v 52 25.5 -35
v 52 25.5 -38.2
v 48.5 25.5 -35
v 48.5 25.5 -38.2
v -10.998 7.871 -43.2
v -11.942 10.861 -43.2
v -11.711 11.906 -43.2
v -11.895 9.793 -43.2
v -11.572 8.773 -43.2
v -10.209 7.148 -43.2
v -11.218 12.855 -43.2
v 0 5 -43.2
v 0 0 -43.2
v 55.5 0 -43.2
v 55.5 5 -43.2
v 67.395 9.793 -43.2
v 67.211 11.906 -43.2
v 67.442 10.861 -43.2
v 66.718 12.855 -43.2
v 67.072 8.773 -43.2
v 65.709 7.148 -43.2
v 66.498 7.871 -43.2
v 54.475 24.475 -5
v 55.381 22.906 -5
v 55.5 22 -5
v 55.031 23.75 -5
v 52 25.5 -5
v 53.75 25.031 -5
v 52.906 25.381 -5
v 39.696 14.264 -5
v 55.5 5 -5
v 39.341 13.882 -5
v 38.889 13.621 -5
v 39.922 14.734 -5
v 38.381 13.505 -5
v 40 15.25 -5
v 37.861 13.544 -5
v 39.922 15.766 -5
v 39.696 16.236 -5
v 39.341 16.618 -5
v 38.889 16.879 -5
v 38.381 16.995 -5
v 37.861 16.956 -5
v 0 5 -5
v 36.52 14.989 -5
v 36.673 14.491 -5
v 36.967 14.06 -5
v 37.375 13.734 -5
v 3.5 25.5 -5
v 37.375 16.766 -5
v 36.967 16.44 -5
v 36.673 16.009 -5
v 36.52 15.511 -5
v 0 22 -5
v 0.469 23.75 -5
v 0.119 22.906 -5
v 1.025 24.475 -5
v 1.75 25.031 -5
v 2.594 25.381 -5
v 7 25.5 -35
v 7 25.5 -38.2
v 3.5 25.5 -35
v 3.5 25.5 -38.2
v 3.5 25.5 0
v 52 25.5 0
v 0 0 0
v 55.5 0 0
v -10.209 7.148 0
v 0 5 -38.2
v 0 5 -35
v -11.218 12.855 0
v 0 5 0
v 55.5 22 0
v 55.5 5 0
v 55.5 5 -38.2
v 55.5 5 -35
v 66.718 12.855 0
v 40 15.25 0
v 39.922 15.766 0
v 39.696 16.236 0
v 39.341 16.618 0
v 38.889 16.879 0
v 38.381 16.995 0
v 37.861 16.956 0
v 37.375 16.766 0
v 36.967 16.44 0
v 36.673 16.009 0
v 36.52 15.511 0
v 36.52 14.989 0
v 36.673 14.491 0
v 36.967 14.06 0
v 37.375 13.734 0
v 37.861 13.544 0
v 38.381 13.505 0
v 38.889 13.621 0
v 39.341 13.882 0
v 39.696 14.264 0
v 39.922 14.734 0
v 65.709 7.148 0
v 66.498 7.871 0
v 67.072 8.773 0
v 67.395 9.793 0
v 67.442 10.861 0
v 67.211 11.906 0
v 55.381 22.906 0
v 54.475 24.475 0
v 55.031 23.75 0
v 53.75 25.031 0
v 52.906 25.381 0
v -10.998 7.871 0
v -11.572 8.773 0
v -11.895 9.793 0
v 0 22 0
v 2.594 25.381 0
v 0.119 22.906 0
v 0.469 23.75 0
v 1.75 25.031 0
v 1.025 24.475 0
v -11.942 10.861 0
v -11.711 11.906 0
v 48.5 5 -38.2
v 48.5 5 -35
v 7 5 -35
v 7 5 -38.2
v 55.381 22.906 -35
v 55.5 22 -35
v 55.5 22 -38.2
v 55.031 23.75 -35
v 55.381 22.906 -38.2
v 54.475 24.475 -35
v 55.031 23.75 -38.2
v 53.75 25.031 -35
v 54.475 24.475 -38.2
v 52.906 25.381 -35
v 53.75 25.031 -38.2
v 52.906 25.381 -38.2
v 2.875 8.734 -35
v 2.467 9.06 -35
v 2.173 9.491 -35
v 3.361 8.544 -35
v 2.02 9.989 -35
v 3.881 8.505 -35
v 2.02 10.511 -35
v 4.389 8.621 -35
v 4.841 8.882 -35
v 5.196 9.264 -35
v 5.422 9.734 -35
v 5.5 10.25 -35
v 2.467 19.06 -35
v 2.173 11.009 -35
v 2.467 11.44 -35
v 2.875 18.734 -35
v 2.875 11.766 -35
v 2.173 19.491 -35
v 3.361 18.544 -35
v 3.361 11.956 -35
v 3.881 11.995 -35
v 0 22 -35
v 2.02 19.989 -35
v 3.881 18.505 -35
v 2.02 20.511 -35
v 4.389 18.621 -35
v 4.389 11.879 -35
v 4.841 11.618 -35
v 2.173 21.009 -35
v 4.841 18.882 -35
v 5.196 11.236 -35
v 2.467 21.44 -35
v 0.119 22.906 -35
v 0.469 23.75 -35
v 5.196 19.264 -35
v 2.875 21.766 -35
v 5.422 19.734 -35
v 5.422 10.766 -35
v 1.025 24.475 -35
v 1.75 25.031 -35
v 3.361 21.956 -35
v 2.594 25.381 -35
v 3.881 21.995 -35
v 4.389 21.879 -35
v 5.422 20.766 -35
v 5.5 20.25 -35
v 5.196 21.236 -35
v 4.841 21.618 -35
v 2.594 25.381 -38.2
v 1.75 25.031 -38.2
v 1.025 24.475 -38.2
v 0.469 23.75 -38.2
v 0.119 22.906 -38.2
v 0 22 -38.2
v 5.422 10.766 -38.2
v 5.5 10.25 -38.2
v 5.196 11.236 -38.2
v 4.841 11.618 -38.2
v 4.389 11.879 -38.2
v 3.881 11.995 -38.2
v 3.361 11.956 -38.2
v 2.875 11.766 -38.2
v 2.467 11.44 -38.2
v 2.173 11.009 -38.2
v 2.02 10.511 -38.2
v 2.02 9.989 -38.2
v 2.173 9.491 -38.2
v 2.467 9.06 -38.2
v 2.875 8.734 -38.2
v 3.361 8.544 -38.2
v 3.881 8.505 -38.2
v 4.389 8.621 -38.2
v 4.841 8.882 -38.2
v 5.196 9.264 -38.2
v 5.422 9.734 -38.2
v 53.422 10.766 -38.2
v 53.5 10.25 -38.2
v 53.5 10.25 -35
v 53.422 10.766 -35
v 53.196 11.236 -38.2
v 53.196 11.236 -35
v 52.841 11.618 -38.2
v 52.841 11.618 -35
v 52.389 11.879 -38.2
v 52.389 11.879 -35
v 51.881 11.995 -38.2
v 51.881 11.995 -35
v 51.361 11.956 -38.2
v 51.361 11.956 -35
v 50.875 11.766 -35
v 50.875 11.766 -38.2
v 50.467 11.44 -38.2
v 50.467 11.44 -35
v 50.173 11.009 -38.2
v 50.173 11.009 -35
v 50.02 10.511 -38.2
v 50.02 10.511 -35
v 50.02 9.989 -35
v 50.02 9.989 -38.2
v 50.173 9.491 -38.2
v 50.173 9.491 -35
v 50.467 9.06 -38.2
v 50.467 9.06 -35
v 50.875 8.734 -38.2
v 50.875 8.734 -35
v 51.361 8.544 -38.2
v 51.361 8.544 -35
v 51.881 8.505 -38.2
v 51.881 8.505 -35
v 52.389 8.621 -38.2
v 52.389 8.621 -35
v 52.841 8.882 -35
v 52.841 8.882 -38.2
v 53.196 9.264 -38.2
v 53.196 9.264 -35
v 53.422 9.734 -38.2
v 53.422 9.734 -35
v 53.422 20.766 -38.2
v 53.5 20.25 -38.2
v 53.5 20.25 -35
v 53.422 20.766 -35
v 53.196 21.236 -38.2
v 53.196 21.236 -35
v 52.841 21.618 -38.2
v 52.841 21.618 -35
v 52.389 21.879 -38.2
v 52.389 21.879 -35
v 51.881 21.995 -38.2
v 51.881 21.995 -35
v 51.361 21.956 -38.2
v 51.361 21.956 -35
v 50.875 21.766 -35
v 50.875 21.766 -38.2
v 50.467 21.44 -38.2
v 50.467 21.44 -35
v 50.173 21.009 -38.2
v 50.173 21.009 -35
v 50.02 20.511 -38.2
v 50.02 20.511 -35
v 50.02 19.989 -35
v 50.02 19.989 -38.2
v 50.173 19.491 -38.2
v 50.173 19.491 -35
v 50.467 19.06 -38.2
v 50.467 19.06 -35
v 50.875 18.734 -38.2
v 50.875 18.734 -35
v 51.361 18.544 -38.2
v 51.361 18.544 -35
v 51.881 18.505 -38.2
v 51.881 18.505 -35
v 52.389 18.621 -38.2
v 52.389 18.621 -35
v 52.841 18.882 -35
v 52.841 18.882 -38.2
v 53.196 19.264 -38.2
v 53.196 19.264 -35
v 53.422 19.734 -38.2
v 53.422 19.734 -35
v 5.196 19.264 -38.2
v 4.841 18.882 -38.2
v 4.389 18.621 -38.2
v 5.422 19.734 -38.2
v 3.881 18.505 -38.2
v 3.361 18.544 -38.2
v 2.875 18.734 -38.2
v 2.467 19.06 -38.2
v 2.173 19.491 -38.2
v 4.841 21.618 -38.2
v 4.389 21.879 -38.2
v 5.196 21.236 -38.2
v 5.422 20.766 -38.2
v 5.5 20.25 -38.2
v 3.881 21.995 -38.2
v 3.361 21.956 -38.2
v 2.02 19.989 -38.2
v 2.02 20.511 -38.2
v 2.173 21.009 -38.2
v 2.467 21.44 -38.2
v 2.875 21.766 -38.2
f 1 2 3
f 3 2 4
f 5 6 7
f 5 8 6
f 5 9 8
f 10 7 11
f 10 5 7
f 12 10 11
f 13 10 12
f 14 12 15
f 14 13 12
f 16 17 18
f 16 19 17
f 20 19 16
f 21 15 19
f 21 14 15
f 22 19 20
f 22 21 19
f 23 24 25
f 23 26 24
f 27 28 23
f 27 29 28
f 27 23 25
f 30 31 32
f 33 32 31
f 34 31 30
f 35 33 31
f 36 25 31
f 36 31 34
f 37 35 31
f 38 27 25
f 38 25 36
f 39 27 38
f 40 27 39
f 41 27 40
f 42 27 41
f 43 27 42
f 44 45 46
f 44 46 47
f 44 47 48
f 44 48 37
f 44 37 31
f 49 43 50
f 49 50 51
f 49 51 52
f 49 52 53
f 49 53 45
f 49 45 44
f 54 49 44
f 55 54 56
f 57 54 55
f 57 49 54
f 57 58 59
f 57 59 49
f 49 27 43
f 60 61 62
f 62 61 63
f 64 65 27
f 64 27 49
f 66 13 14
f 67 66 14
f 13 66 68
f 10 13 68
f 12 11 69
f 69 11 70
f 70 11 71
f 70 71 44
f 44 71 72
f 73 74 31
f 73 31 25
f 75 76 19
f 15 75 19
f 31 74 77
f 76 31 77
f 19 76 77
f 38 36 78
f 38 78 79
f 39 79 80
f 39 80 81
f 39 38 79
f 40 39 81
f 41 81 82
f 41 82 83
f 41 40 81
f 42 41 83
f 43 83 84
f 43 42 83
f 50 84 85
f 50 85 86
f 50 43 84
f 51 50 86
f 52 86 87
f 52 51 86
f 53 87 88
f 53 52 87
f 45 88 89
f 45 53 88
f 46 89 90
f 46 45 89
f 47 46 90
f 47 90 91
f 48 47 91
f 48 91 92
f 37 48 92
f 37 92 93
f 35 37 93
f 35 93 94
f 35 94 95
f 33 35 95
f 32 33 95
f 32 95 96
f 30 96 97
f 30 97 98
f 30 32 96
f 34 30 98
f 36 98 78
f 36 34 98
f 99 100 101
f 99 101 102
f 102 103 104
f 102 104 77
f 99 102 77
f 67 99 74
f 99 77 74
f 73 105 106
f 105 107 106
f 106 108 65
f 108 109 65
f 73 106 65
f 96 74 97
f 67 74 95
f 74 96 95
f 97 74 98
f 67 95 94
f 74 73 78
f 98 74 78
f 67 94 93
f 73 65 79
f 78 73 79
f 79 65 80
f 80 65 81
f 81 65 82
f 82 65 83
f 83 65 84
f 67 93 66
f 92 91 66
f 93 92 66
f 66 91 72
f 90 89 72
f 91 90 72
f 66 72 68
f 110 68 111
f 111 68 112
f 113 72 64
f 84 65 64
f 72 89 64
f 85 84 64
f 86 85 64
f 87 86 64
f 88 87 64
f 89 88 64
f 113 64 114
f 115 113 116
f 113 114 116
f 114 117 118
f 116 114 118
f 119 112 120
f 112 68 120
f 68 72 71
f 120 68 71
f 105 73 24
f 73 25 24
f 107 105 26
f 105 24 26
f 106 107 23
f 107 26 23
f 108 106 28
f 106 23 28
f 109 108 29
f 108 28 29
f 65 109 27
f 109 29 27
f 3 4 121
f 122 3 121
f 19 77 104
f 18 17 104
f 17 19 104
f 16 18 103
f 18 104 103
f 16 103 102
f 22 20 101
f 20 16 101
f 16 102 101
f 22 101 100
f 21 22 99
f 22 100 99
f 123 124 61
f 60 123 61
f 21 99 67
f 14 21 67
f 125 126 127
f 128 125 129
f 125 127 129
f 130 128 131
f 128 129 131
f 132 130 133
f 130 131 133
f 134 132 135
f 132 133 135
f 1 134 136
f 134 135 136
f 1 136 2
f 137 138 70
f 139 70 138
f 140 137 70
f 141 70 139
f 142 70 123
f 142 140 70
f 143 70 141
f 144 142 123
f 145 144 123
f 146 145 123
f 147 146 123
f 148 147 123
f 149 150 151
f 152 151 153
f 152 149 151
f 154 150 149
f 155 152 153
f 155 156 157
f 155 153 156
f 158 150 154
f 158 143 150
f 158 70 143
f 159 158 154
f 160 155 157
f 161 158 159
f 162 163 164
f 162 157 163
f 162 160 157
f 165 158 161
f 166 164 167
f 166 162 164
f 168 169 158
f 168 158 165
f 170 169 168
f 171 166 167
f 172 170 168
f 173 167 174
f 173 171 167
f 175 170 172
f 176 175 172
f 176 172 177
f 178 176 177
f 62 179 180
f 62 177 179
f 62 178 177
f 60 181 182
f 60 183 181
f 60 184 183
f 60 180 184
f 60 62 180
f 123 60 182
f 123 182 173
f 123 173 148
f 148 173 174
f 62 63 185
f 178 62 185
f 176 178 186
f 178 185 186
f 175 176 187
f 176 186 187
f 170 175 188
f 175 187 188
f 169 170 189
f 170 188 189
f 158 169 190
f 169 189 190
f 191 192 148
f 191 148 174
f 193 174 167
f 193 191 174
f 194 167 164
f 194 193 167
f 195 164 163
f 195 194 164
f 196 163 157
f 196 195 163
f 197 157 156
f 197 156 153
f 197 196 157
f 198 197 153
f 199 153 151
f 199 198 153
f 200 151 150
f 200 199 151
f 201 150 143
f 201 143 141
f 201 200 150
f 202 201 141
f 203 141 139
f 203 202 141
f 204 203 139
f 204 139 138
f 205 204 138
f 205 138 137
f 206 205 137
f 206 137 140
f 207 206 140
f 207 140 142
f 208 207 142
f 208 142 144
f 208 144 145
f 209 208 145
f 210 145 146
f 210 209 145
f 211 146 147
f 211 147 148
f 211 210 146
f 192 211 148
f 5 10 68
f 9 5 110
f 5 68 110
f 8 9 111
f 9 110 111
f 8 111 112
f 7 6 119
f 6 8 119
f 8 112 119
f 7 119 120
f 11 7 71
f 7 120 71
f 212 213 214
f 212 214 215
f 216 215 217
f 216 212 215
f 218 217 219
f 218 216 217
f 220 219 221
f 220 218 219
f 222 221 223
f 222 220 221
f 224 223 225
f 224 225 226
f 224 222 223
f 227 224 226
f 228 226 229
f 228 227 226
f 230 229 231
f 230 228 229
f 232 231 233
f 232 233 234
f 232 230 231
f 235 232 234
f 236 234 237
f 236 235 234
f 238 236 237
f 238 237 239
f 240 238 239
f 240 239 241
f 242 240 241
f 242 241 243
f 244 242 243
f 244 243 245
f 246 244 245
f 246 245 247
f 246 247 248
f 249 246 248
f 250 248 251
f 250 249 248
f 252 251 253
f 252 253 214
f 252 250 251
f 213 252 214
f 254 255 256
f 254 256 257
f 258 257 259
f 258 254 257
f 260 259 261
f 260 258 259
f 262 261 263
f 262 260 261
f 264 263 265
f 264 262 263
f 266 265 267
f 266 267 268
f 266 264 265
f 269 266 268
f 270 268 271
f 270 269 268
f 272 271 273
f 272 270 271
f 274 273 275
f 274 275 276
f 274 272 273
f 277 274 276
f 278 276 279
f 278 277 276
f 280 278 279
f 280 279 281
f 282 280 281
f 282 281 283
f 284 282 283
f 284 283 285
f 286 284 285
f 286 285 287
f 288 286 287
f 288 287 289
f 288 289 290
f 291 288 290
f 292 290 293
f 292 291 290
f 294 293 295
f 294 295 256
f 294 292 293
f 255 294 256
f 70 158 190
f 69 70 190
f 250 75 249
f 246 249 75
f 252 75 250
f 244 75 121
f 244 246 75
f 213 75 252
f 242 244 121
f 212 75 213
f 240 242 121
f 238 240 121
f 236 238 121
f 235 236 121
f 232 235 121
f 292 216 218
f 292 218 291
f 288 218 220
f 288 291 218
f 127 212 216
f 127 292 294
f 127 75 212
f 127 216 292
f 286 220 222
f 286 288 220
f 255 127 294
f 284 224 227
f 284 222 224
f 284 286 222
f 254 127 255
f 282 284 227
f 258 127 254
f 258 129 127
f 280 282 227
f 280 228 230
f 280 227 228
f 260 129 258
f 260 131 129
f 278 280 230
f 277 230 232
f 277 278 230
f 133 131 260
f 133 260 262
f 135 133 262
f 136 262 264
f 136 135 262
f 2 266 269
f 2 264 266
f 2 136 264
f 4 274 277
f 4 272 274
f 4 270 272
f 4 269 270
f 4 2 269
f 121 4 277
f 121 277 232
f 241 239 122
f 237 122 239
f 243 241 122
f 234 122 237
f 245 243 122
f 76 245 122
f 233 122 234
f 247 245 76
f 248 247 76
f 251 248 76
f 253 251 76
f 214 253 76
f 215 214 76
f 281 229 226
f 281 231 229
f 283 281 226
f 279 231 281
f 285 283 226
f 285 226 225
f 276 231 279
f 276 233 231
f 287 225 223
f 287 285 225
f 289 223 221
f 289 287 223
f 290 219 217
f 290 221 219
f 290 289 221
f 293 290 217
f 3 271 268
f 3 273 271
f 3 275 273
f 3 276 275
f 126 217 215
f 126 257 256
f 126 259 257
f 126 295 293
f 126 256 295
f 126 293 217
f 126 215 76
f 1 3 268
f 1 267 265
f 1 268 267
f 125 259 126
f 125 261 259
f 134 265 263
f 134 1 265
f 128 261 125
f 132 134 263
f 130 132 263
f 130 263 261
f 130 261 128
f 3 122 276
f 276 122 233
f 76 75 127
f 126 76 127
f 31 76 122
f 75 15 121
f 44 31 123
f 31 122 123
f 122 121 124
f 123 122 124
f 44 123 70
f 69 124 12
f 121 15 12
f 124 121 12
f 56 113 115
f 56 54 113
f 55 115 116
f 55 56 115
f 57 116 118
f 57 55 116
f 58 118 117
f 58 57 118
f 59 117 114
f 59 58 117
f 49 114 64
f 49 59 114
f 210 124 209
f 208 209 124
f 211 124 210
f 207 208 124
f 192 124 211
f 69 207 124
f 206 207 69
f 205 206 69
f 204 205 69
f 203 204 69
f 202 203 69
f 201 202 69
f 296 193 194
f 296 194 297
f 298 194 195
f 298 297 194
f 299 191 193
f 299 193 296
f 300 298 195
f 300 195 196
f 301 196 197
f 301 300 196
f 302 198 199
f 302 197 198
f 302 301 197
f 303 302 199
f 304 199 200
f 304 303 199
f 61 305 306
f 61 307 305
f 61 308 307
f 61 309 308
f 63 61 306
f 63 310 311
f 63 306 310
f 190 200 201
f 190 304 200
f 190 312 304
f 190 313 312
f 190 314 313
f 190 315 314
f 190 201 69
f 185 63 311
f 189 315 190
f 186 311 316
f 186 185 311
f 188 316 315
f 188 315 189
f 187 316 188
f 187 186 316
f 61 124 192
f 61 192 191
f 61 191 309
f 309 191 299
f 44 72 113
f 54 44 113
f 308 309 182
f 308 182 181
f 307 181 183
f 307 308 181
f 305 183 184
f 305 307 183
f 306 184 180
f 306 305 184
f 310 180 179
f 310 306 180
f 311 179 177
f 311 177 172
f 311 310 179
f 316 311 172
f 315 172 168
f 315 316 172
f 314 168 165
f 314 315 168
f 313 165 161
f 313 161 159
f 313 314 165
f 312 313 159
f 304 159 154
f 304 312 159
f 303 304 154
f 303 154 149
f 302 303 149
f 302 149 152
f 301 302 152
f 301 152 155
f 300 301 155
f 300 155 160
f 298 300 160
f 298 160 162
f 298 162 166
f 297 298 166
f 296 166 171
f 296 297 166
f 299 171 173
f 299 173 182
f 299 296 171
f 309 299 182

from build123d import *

# Parameters (mm, degrees)
SKETCH1_W            = 55.5
SKETCH1_H            = 43.2
BASE_DEPTH           = 5
SKETCH2_W            = 55.5
SKETCH2_H            = 25.5
WALL_DEPTH           = 5
SKETCH3_W            = 7
SKETCH3_H            = 20.5
MOUNTINGTABS_DEPTH   = 5
LIPS_REACH           = 76.811
SKETCH5_R            = 1.75
MOUNTINGHOLES_DEPTH  = 5
FILLETS_R            = 3.5
SKETCH6_R            = 1.75
THROUGHHOLE_DEPTH    = 5
MIRROR1_START        = -40
MIRROR1_OUTLINE_R    = 1.75
MIRROR1_DEPTH        = 1.8
MIRROR1_START_2      = -38.2
MIRROR1_2_OUTLINE_R  = 1.75
MIRROR1_2_DEPTH      = 3.2
FILLETS_OF_MIRROR2_R = 3.5
CUT_EXTRUDE2_DEPTH   = 5
CUT_EXTRUDE3_DEPTH   = 3.2


# Read off the part's stored shape, not the designer's step: Mirror1
with BuildPart() as part:
    # Sketch1 → base (new body)
    with BuildSketch(Plane(origin=(0, 0, 0), x_dir=(1, 0, 0), z_dir=(0, 1, 0))):
        with Locations((27.75, 21.6)):
            Rectangle(SKETCH1_W, SKETCH1_H)
    extrude(amount=BASE_DEPTH)

    # Sketch2 → wall (add)
    with BuildSketch(Plane(origin=(0, 0, -43.2), x_dir=(-1, 0, 0), z_dir=(0, 0, -1))):
        with Locations((-27.75, 12.75)):
            Rectangle(SKETCH2_W, SKETCH2_H)
    wall = extrude(amount=-WALL_DEPTH)

    # Sketch3 → mountingTabs (add)
    with BuildSketch(Plane.XY.offset(-8.2)):
        with Locations((3.5, 15.25)):
            Rectangle(SKETCH3_W, SKETCH3_H)
        with Locations((52, 15.25)):
            Rectangle(SKETCH3_W, SKETCH3_H)
    extrude(amount=MOUNTINGTABS_DEPTH)

    # lips: up to this face of the body (flat: up to its plane)
    lips_end = Plane(part.part.faces().sort_by_distance((27.75, 12.75, -43.2))[0])
    # Sketch4 → lips (add, up to the picked face)
    with BuildSketch(Plane.XY, mode=Mode.PRIVATE) as lips_sk1:
        with BuildLine():
            Line((0, 0), (-10.208884478, 7.148337868))
            ThreePointArc((-10.208884478, 7.148337868), (-11.894564223, 9.792816133), (-11.218174515, 12.85505036))
            Line((-11.218174515, 12.85505036), (0, 5))
            Line((0, 5), (0, 0))
        make_face()
    lips_tool1 = split(extrude(lips_sk1.sketch, amount=-LIPS_REACH, mode=Mode.PRIVATE), bisect_by=lips_end, keep=Keep.BOTH, mode=Mode.PRIVATE)
    # Sketch4 → lips (add, up to the picked face)
    with BuildSketch(Plane.XY, mode=Mode.PRIVATE) as lips_sk2:
        with BuildLine():
            Line((55.5, 5), (66.718174515, 12.85505036))
            ThreePointArc((66.718174515, 12.85505036), (67.394564223, 9.792816133), (65.708884478, 7.148337868))
            Line((65.708884478, 7.148337868), (55.5, 0))
            Line((55.5, 0), (55.5, 5))
        make_face()
    lips_tool2 = split(extrude(lips_sk2.sketch, amount=-LIPS_REACH, mode=Mode.PRIVATE), bisect_by=lips_end, keep=Keep.BOTH, mode=Mode.PRIVATE)
    add(lips_tool1.solids().sort_by(Axis((-5.839287, 6.590277, 0), (0, 0, -1)))[0])
    add(lips_tool2.solids().sort_by(Axis((61.339287, 6.590277, 0), (0, 0, -1)))[0])

    # Sketch5 → mountingHoles (cut)
    with BuildSketch(Plane.XY.offset(-3.2)):
        with Locations((3.75, 20.25)):
            Circle(SKETCH5_R)
        with Locations(Location((3.75, 10.25, 0), (0, 0, 180))):
            Circle(SKETCH5_R)
        with Locations((51.75, 10.25)):
            Circle(SKETCH5_R)
        with Locations(Location((51.75, 20.25, 0), (0, 0, 180))):
            Circle(SKETCH5_R)
    extrude(amount=-MOUNTINGHOLES_DEPTH, mode=Mode.SUBTRACT)

    # fillets
    fillets_edges = [part.edges().sort_by_distance(p)[0] for p in [
        (0, 25.5, -40.7),
        (55.5, 25.5, -40.7),
        (0, 25.5, -5.7),
        (55.5, 25.5, -5.7),
    ]]
    fillet(fillets_edges, radius=FILLETS_R)

    # Sketch6 → throughHole (cut)
    with BuildSketch(Plane.XY.offset(-38.2)):
        with Locations((38.25, 15.25)):
            Circle(SKETCH6_R)
    throughhole = extrude(amount=-THROUGHHOLE_DEPTH, mode=Mode.SUBTRACT)

    # Mirror1 outline → Mirror1 (cut)
    with BuildSketch(Plane.XY.offset(MIRROR1_START)):
        with Locations((51.75, 10.25)):
            Circle(MIRROR1_OUTLINE_R)
        with Locations((51.75, 20.25)):
            Circle(MIRROR1_OUTLINE_R)
        with Locations((3.75, 20.25)):
            Circle(MIRROR1_OUTLINE_R)
        with Locations((3.75, 10.25)):
            Circle(MIRROR1_OUTLINE_R)
    extrude(amount=MIRROR1_DEPTH, mode=Mode.SUBTRACT)

    # Mirror1 2 outline → Mirror1 2 (add)
    # profile 1 of 2: a face of its own
    with BuildSketch(Plane.XY.offset(MIRROR1_START_2)):
        with BuildLine():
            ThreePointArc((55.5, 22), (54.474873734, 24.474873734), (52, 25.5))
            Line((52, 25.5), (48.5, 25.5))
            Line((48.5, 25.5), (48.5, 5))
            Line((48.5, 5), (55.5, 5))
            Line((55.5, 5), (55.5, 22))
        make_face()
        with Locations((51.75, 10.25)):
            Circle(MIRROR1_2_OUTLINE_R, mode=Mode.SUBTRACT)
        with Locations((51.75, 20.25)):
            Circle(MIRROR1_2_OUTLINE_R, mode=Mode.SUBTRACT)
    # profile 2 of 2: a face of its own
    with BuildSketch(Plane.XY.offset(MIRROR1_START_2)):
        with BuildLine():
            Line((7, 5), (7, 25.5))
            Line((7, 25.5), (3.5, 25.5))
            ThreePointArc((3.5, 25.5), (1.025126266, 24.474873734), (0, 22))
            Line((0, 22), (0, 5))
            Line((0, 5), (7, 5))
        make_face()
        with Locations((3.75, 10.25)):
            Circle(MIRROR1_2_OUTLINE_R, mode=Mode.SUBTRACT)
        with Locations((3.75, 20.25)):
            Circle(MIRROR1_2_OUTLINE_R, mode=Mode.SUBTRACT)
    extrude(amount=MIRROR1_2_DEPTH)

    # Mirror2: wall, throughHole across plane
    add(wall.mirror(Plane(origin=(0, 0, -21.6), x_dir=(1, 0, 0), z_dir=(0, 0, -1))))
    add(throughhole.mirror(Plane(origin=(0, 0, -21.6), x_dir=(1, 0, 0), z_dir=(0, 0, -1))), mode=Mode.SUBTRACT)

    # fillets of Mirror2
    fillets_of_mirror2_edges = [part.edges().sort_by_distance(p)[0] for p in [
        (0, 25.5, -2.5),
        (55.5, 25.5, -2.5),
        (0, 25.5, -37.5),
        (55.5, 25.5, -37.5),
    ]]
    fillet(fillets_of_mirror2_edges, radius=FILLETS_OF_MIRROR2_R)

    # Sketch7 → Cut-Extrude2 (cut)
    with BuildSketch(Plane(origin=(0, 0, -43.2), x_dir=(-1, 0, 0), z_dir=(0, 0, -1))):
        with BuildLine():
            Line((-55.5, 5), (0, 5))
            Line((0, 5), (0, 22))
            ThreePointArc((0, 22), (-1.025126266, 24.474873734), (-3.5, 25.5))
            Line((-3.5, 25.5), (-52, 25.5))
            ThreePointArc((-52, 25.5), (-54.474873734, 24.474873734), (-55.5, 22))
            Line((-55.5, 22), (-55.5, 5))
        make_face()
    extrude(amount=-CUT_EXTRUDE2_DEPTH, mode=Mode.SUBTRACT)

    # Sketch8 → Cut-Extrude3 (cut)
    with BuildSketch(Plane(origin=(0, 0, -8.2), x_dir=(-1, 0, 0), z_dir=(0, 0, -1))):
        with BuildLine():
            Line((-48.5, 25.5), (-52, 25.5))
            ThreePointArc((-52, 25.5), (-54.474873734, 24.474873734), (-55.5, 22))
            Line((-55.5, 22), (-55.5, 5))
            Line((-55.5, 5), (-48.5, 5))
            Line((-48.5, 5), (-48.5, 25.5))
        make_face()
        with BuildLine():
            Line((0, 5), (0, 22))
            ThreePointArc((0, 22), (-1.025126266, 24.474873734), (-3.5, 25.5))
            Line((-3.5, 25.5), (-7, 25.5))
            Line((-7, 25.5), (-7, 5))
            Line((-7, 5), (0, 5))
        make_face()
    extrude(amount=-CUT_EXTRUDE3_DEPTH, mode=Mode.SUBTRACT)


solid = part.part
